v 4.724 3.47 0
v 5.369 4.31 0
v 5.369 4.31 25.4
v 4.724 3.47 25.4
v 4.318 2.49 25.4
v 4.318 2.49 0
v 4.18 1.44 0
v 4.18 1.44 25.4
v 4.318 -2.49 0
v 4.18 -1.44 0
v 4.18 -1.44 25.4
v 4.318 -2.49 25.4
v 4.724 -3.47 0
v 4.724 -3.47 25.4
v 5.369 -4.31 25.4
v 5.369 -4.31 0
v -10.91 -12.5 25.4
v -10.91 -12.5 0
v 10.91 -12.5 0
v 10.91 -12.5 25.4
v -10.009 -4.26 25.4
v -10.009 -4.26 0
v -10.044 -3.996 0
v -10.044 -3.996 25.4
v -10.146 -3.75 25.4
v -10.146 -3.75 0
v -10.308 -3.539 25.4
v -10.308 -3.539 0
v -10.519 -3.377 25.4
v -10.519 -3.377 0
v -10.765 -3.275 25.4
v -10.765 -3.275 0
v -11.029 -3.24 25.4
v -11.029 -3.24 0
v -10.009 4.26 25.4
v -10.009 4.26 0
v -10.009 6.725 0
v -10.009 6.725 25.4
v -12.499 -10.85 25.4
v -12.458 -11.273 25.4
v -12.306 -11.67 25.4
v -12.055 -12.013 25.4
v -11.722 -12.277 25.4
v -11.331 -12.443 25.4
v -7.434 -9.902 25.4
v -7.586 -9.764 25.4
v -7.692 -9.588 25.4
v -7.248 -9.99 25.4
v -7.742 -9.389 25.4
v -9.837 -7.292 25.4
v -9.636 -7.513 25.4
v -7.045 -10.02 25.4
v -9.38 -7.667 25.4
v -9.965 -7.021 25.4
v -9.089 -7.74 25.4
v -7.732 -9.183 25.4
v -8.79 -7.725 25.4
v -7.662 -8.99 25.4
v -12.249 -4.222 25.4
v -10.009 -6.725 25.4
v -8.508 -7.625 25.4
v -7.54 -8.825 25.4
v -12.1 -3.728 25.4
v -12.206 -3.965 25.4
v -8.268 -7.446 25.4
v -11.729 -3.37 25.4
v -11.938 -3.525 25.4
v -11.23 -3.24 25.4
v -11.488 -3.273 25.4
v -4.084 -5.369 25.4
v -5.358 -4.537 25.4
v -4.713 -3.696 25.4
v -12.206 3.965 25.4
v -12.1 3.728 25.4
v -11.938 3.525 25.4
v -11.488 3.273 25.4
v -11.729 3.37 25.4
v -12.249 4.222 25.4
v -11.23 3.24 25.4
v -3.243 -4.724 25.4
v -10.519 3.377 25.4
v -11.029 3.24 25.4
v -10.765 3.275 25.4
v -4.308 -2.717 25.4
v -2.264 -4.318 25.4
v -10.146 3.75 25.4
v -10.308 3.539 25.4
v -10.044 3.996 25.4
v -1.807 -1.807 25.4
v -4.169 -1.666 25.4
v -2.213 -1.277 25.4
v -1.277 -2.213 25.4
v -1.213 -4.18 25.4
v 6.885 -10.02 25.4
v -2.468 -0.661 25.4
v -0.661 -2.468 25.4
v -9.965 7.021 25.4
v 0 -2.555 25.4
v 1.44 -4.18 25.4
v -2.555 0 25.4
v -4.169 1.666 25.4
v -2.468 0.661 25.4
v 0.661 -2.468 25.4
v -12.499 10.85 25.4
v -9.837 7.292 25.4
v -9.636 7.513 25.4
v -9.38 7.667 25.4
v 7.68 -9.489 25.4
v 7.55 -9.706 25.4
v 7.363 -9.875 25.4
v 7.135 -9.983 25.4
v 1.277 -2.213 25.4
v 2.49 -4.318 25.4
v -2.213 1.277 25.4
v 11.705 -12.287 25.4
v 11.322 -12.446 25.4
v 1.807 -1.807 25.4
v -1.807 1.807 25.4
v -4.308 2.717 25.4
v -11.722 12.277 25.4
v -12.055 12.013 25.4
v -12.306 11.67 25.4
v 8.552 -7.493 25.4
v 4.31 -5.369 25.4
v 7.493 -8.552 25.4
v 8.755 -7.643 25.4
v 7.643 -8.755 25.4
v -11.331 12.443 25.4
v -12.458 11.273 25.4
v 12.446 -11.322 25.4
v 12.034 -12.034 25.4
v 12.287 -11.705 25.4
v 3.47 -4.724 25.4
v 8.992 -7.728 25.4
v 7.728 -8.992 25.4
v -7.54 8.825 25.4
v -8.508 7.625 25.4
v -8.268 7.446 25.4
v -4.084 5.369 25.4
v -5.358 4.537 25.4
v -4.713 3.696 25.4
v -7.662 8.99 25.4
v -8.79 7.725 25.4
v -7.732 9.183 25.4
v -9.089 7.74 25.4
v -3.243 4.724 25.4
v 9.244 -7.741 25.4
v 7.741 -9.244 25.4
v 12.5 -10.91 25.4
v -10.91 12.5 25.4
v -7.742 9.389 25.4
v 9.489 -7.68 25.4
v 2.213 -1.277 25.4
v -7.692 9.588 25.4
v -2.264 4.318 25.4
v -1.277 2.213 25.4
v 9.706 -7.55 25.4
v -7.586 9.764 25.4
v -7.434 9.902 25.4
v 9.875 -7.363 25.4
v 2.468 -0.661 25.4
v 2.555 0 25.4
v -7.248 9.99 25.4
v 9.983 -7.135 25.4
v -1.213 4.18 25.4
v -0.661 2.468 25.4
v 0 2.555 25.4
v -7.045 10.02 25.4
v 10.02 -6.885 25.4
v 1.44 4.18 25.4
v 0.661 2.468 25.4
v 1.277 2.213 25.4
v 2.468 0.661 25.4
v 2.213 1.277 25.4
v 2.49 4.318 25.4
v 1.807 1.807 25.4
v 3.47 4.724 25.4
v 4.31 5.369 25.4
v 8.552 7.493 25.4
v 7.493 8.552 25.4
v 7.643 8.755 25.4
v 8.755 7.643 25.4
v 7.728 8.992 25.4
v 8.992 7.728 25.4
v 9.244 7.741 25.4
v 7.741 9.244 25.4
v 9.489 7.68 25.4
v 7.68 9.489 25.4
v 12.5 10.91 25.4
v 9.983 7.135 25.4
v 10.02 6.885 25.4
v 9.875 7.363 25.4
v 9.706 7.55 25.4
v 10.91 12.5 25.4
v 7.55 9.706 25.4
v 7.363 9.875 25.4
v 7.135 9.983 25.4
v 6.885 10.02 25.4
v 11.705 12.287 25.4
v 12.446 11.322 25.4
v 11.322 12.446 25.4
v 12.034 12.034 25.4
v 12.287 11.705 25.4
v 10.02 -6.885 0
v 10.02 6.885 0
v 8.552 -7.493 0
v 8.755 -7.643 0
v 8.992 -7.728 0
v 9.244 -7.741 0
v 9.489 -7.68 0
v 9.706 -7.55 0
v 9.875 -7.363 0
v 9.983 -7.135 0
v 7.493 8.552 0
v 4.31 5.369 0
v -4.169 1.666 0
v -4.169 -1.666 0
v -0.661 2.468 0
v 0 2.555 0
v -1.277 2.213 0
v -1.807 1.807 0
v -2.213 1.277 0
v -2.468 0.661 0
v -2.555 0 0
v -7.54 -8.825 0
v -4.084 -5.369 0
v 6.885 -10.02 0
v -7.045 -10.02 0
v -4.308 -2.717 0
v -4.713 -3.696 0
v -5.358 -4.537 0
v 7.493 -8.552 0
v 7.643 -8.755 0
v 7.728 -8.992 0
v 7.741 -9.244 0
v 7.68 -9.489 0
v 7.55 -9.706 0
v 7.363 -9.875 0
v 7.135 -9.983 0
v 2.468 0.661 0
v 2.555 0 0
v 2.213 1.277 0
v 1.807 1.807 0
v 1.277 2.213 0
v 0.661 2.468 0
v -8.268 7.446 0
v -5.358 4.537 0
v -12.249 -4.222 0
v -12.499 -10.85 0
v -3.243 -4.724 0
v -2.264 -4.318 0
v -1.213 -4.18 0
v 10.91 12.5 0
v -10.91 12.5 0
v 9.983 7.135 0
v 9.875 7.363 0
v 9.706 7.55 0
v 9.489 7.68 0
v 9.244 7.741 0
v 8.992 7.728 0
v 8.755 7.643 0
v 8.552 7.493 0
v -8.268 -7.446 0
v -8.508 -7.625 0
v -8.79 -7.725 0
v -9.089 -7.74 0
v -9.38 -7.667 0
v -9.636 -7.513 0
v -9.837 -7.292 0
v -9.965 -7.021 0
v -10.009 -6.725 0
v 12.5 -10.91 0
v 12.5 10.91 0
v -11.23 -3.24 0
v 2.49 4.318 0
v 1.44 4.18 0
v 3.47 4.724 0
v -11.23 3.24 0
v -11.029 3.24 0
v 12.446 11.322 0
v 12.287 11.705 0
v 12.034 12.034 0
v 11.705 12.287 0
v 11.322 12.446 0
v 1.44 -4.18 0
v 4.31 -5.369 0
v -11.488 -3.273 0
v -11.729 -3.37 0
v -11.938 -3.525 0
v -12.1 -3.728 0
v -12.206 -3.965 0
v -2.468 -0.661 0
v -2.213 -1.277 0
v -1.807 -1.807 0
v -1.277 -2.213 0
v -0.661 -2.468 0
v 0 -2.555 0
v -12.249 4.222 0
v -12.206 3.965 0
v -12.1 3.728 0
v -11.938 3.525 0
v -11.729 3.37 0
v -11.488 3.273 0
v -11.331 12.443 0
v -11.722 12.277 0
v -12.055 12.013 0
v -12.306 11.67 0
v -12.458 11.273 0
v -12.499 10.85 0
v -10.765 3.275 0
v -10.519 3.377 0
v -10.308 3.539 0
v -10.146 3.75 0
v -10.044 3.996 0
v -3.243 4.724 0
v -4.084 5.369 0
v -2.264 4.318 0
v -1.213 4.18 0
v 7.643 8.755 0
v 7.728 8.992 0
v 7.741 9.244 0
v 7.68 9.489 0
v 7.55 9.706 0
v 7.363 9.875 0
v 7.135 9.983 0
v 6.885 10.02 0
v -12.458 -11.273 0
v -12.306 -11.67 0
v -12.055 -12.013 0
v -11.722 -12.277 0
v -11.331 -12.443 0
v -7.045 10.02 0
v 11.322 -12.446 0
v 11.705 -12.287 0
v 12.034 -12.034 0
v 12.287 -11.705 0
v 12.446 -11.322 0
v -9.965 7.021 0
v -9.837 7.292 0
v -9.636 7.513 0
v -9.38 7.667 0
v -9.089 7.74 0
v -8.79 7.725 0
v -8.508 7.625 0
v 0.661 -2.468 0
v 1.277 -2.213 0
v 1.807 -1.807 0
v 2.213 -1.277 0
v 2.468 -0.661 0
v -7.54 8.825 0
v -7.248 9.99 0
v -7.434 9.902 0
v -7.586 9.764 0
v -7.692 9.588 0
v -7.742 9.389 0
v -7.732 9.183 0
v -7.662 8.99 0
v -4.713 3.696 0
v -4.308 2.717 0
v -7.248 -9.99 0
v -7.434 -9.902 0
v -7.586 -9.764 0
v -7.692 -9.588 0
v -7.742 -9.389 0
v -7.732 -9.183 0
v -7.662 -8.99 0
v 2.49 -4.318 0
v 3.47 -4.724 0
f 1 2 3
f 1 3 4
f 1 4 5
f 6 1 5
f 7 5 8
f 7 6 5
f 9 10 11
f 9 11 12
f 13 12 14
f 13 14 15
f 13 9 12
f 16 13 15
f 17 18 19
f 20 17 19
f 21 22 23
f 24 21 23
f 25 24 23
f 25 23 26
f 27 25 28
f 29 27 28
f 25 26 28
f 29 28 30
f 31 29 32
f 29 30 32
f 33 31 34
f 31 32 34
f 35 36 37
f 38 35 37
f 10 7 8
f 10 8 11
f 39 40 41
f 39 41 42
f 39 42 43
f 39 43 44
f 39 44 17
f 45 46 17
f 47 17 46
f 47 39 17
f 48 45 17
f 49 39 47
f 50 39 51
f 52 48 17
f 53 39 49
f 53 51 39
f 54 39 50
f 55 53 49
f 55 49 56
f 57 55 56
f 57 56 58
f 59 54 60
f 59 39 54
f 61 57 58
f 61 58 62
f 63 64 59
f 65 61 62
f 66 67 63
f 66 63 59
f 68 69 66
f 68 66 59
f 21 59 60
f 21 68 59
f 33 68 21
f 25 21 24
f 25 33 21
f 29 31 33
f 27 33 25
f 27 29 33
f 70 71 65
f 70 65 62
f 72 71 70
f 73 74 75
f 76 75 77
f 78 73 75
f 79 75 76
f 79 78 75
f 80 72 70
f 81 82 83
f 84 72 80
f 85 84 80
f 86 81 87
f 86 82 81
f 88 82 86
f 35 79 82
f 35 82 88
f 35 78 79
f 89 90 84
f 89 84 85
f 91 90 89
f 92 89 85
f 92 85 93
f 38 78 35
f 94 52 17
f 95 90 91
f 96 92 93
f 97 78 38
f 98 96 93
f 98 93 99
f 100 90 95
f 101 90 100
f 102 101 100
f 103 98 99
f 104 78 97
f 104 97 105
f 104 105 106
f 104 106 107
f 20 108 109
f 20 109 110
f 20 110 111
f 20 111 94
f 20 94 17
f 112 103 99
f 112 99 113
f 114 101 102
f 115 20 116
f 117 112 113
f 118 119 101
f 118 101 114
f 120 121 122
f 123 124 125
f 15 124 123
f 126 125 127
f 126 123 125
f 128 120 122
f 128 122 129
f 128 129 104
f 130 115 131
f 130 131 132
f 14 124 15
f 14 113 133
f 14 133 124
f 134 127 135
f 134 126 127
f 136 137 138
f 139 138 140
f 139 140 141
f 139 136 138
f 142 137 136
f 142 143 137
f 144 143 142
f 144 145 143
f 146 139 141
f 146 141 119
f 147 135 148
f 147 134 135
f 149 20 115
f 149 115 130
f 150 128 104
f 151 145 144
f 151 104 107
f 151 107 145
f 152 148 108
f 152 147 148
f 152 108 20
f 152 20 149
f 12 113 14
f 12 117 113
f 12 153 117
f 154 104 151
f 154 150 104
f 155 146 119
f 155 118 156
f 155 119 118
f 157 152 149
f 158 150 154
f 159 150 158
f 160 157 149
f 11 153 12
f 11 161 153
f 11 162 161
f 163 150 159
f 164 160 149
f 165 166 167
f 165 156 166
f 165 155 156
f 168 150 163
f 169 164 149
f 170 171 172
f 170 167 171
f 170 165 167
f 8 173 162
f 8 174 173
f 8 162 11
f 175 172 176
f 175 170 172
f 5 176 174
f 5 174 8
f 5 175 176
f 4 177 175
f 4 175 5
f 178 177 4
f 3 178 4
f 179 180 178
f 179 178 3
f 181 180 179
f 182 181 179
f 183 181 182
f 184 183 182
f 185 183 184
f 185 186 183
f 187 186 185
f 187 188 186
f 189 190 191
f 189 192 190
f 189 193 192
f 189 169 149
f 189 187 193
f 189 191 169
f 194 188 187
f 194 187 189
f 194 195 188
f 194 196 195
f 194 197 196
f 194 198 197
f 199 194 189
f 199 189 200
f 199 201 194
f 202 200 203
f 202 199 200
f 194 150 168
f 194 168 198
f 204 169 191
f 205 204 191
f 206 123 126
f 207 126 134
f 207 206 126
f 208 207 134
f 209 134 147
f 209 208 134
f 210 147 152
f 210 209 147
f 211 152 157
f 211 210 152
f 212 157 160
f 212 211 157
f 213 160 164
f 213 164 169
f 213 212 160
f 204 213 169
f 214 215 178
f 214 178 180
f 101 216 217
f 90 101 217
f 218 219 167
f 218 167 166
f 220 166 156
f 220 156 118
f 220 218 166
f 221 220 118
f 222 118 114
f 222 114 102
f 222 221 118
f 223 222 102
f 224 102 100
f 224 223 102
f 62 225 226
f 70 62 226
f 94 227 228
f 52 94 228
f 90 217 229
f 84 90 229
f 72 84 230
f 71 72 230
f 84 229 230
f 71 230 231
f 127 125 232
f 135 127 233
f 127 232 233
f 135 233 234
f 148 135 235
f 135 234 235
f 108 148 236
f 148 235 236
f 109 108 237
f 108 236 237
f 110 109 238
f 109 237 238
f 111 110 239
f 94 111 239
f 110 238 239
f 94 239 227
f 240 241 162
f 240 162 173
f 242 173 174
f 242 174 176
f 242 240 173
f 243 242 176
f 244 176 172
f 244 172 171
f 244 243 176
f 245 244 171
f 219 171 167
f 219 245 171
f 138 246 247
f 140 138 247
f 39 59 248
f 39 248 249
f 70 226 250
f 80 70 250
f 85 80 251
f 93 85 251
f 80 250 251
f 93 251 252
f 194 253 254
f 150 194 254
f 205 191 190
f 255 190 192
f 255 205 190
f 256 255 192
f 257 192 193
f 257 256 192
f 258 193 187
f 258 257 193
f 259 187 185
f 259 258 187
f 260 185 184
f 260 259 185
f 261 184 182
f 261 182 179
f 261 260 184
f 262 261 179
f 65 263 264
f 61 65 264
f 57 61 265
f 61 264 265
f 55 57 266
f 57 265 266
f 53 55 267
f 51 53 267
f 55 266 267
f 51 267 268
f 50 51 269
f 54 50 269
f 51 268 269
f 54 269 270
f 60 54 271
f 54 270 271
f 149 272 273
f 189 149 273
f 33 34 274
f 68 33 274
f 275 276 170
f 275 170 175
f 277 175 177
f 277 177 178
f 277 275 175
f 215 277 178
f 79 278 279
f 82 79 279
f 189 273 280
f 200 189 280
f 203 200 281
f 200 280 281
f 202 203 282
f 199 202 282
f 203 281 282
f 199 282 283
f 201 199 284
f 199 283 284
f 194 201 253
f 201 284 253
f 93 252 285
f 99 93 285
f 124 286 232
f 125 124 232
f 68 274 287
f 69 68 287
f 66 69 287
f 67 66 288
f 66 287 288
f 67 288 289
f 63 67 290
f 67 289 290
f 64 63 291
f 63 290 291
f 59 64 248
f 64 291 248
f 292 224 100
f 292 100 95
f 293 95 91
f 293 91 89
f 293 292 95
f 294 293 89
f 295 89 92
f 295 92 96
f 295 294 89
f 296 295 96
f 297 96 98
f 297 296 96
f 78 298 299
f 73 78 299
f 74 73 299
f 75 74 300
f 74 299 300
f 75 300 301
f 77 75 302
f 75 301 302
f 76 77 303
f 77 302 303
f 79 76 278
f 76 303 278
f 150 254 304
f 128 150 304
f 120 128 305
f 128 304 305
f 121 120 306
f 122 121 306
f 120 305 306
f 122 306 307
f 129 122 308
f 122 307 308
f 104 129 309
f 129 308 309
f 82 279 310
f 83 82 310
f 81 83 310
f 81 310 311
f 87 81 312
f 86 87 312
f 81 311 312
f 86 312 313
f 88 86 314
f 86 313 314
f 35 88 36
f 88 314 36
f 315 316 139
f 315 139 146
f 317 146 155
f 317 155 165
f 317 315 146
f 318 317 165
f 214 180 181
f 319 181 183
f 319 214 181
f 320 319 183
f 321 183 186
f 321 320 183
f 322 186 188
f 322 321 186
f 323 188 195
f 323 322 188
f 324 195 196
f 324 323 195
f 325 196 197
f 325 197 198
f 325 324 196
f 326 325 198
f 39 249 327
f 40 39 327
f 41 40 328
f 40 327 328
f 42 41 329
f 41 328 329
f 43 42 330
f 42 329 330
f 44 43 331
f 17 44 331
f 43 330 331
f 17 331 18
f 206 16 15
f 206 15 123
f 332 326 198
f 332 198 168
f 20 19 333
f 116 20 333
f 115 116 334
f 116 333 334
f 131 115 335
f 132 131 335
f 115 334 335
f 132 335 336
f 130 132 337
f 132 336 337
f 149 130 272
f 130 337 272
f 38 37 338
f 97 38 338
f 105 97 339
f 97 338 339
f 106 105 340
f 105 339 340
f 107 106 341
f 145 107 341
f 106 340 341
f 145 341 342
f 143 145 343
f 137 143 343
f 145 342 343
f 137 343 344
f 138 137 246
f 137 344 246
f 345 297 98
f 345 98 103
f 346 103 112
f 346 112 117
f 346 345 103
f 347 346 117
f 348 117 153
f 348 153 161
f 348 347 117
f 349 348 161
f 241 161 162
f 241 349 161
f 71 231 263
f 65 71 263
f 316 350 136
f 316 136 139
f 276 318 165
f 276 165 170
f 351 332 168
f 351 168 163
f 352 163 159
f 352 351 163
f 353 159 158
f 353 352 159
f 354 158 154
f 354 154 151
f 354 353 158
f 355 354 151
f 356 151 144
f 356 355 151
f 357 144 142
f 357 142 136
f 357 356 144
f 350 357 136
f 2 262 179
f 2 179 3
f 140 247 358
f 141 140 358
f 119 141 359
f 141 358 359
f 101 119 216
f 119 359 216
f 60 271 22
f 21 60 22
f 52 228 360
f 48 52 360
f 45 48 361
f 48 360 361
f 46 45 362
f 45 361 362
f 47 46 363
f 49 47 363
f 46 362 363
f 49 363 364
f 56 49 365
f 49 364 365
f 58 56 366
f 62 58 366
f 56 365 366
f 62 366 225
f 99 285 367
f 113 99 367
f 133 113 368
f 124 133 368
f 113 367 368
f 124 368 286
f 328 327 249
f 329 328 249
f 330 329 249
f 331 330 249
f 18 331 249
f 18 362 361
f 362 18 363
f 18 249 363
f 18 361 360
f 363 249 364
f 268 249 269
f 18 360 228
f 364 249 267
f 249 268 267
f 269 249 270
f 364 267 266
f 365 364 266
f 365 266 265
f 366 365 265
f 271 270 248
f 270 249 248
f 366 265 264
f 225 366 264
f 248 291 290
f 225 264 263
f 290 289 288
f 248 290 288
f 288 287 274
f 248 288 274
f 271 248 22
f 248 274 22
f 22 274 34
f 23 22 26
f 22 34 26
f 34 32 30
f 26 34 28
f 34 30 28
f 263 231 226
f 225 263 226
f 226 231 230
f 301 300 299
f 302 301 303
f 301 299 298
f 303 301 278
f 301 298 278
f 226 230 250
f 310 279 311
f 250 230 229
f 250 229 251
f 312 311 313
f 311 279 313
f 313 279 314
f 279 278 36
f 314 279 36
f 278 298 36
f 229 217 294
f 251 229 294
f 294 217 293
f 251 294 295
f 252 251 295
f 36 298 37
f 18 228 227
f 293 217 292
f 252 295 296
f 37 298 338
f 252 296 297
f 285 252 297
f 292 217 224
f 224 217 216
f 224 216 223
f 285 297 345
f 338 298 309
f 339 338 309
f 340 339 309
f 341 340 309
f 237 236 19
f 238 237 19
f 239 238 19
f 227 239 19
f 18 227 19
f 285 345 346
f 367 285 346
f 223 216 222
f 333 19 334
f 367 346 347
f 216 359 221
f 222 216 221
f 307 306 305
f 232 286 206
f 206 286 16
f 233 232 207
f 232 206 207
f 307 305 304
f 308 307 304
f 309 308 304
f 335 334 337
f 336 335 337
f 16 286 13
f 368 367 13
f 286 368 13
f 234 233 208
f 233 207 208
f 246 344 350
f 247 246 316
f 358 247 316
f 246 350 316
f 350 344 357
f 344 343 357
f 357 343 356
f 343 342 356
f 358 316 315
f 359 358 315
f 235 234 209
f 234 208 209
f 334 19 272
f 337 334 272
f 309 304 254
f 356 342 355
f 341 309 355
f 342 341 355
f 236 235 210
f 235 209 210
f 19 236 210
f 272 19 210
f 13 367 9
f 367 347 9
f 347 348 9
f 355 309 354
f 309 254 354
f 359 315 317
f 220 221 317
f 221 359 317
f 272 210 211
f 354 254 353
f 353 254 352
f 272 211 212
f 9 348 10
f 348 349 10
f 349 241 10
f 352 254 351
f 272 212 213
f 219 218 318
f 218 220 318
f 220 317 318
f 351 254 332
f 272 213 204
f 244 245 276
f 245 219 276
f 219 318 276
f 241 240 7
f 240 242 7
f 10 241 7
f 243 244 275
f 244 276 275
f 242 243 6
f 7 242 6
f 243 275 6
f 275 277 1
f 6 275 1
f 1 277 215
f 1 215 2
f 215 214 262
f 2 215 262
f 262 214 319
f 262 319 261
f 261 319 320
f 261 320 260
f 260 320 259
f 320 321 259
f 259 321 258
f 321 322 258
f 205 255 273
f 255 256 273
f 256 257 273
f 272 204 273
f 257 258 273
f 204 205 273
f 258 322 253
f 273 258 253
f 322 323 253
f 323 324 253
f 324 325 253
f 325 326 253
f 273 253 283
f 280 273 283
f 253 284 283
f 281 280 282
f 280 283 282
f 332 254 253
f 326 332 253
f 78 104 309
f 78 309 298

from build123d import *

# Parameters (mm, degrees)
EXTRUDE1_DEPTH = 25.4


with BuildPart() as part:
    # Sketch1 → Extrude1 (new body)
    with BuildSketch(Plane.XY):
        with BuildLine():
            Line((-8.268033791, 7.446247994), (-5.358427067, 4.536641271))
            ThreePointArc((-5.358427067, 4.536641271), (-4.478329805, 3.219482637), (-4.169280745, 1.665788092))
            Line((-4.169280745, 1.665788092), (-4.169280745, 0))
            Line((-4.169280745, 0), (-4.169280745, -1.665788092))
            ThreePointArc((-4.169280745, -1.665788092), (-4.478329805, -3.219482637), (-5.358427067, -4.536641271))
            Line((-5.358427067, -4.536641271), (-8.268033791, -7.446247994))
            ThreePointArc((-8.268033791, -7.446247994), (-9.379617585, -7.667355758), (-10.009279225, -6.72500052))
            Line((-10.009279225, -6.72500052), (-10.009279225, -4.25999656))
            ThreePointArc((-10.009279225, -4.25999656), (-10.308029711, -3.538749086), (-11.029277185, -3.2399986))
            Line((-11.029277185, -3.2399986), (-11.23000167, -3.2399986))
            ThreePointArc((-11.23000167, -3.2399986), (-11.937549497, -3.525304849), (-12.249277285, -4.221616108))
            Line((-12.249277285, -4.221616108), (-12.49887312, -10.850171322))
            ThreePointArc((-12.49887312, -10.850171322), (-12.055256326, -12.012943733), (-10.90999977, -12.49999913))
            Line((-10.90999977, -12.49999913), (0, -12.49999913))
            Line((0, -12.49999913), (10.90999977, -12.49999913))
            ThreePointArc((10.90999977, -12.49999913), (12.0342991, -12.0342991), (12.49999913, -10.90999977))
            Line((12.49999913, -10.90999977), (12.49999913, 10.90999977))
            ThreePointArc((12.49999913, 10.90999977), (12.0342991, 12.0342991), (10.90999977, 12.49999913))
            Line((10.90999977, 12.49999913), (0, 12.49999913))
            Line((0, 12.49999913), (-10.90999977, 12.49999913))
            ThreePointArc((-10.90999977, 12.49999913), (-12.055256326, 12.012943733), (-12.49887312, 10.850171322))
            Line((-12.49887312, 10.850171322), (-12.249277285, 4.221616108))
            ThreePointArc((-12.249277285, 4.221616108), (-11.937549497, 3.525304849), (-11.23000167, 3.2399986))
            Line((-11.23000167, 3.2399986), (-11.029277185, 3.2399986))
            ThreePointArc((-11.029277185, 3.2399986), (-10.308029711, 3.538749086), (-10.009279225, 4.25999656))
            Line((-10.009279225, 4.25999656), (-10.009279225, 6.72500052))
            ThreePointArc((-10.009279225, 6.72500052), (-9.379617585, 7.667355758), (-8.268033791, 7.446247994))
        make_face()
        with BuildLine():
            Line((-7.539973637, 8.825029193), (-4.084091296, 5.369146852))
            ThreePointArc((-4.084091296, 5.369146852), (-2.766932662, 4.48904959), (-1.213238118, 4.18000053))
            Line((-1.213238118, 4.18000053), (0, 4.18000053))
            Line((0, 4.18000053), (1.439511835, 4.18000053))
            ThreePointArc((1.439511835, 4.18000053), (2.993206379, 4.48904959), (4.310365013, 5.369146852))
            Line((4.310365013, 5.369146852), (7.493110816, 8.551892654))
            ThreePointArc((7.493110816, 8.551892654), (7.679535009, 9.489110364), (6.8850002, 10.02000155))
            Line((6.8850002, 10.02000155), (0, 10.02000155))
            Line((0, 10.02000155), (-7.04499988, 10.02000155))
            ThreePointArc((-7.04499988, 10.02000155), (-7.691714259, 9.587880817), (-7.539973637, 8.825029193))
        make_face(mode=Mode.SUBTRACT)
        with BuildLine():
            Line((0, -10.02000155), (-7.04499988, -10.02000155))
            ThreePointArc((-7.04499988, -10.02000155), (-7.691714259, -9.587880817), (-7.539973637, -8.825029193))
            Line((-7.539973637, -8.825029193), (-4.084091296, -5.369146852))
            ThreePointArc((-4.084091296, -5.369146852), (-2.766932662, -4.48904959), (-1.213238118, -4.18000053))
            Line((-1.213238118, -4.18000053), (0, -4.18000053))
            Line((0, -4.18000053), (1.439511835, -4.18000053))
            ThreePointArc((1.439511835, -4.18000053), (2.993206379, -4.48904959), (4.310365013, -5.369146852))
            Line((4.310365013, -5.369146852), (7.493110816, -8.551892654))
            ThreePointArc((7.493110816, -8.551892654), (7.679535009, -9.489110364), (6.8850002, -10.02000155))
            Line((6.8850002, -10.02000155), (0, -10.02000155))
        make_face(mode=Mode.SUBTRACT)
        with BuildLine():
            Line((8.551892654, 7.493110816), (5.369146852, 4.310365013))
            ThreePointArc((5.369146852, 4.310365013), (4.48904959, 2.993206379), (4.18000053, 1.439511835))
            Line((4.18000053, 1.439511835), (4.18000053, -1.439511835))
            ThreePointArc((4.18000053, -1.439511835), (4.48904959, -2.993206379), (5.369146852, -4.310365013))
            Line((5.369146852, -4.310365013), (8.551892654, -7.493110816))
            ThreePointArc((8.551892654, -7.493110816), (9.489110364, -7.679535009), (10.02000155, -6.8850002))
            Line((10.02000155, -6.8850002), (10.02000155, 6.8850002))
            ThreePointArc((10.02000155, 6.8850002), (9.489110364, 7.679535009), (8.551892654, 7.493110816))
        make_face(mode=Mode.SUBTRACT)
        with BuildLine():
            ThreePointArc((0, 2.55499997), (-1.806657805, 1.806657805), (-2.55499997, 0))
            ThreePointArc((-2.55499997, 0), (-1.806657805, -1.806657805), (0, -2.55499997))
            ThreePointArc((0, -2.55499997), (1.806657805, -1.806657805), (2.55499997, 0))
            ThreePointArc((2.55499997, 0), (1.806657805, 1.806657805), (0, 2.55499997))
        make_face(mode=Mode.SUBTRACT)
    extrude(amount=EXTRUDE1_DEPTH)


solid = part.part
